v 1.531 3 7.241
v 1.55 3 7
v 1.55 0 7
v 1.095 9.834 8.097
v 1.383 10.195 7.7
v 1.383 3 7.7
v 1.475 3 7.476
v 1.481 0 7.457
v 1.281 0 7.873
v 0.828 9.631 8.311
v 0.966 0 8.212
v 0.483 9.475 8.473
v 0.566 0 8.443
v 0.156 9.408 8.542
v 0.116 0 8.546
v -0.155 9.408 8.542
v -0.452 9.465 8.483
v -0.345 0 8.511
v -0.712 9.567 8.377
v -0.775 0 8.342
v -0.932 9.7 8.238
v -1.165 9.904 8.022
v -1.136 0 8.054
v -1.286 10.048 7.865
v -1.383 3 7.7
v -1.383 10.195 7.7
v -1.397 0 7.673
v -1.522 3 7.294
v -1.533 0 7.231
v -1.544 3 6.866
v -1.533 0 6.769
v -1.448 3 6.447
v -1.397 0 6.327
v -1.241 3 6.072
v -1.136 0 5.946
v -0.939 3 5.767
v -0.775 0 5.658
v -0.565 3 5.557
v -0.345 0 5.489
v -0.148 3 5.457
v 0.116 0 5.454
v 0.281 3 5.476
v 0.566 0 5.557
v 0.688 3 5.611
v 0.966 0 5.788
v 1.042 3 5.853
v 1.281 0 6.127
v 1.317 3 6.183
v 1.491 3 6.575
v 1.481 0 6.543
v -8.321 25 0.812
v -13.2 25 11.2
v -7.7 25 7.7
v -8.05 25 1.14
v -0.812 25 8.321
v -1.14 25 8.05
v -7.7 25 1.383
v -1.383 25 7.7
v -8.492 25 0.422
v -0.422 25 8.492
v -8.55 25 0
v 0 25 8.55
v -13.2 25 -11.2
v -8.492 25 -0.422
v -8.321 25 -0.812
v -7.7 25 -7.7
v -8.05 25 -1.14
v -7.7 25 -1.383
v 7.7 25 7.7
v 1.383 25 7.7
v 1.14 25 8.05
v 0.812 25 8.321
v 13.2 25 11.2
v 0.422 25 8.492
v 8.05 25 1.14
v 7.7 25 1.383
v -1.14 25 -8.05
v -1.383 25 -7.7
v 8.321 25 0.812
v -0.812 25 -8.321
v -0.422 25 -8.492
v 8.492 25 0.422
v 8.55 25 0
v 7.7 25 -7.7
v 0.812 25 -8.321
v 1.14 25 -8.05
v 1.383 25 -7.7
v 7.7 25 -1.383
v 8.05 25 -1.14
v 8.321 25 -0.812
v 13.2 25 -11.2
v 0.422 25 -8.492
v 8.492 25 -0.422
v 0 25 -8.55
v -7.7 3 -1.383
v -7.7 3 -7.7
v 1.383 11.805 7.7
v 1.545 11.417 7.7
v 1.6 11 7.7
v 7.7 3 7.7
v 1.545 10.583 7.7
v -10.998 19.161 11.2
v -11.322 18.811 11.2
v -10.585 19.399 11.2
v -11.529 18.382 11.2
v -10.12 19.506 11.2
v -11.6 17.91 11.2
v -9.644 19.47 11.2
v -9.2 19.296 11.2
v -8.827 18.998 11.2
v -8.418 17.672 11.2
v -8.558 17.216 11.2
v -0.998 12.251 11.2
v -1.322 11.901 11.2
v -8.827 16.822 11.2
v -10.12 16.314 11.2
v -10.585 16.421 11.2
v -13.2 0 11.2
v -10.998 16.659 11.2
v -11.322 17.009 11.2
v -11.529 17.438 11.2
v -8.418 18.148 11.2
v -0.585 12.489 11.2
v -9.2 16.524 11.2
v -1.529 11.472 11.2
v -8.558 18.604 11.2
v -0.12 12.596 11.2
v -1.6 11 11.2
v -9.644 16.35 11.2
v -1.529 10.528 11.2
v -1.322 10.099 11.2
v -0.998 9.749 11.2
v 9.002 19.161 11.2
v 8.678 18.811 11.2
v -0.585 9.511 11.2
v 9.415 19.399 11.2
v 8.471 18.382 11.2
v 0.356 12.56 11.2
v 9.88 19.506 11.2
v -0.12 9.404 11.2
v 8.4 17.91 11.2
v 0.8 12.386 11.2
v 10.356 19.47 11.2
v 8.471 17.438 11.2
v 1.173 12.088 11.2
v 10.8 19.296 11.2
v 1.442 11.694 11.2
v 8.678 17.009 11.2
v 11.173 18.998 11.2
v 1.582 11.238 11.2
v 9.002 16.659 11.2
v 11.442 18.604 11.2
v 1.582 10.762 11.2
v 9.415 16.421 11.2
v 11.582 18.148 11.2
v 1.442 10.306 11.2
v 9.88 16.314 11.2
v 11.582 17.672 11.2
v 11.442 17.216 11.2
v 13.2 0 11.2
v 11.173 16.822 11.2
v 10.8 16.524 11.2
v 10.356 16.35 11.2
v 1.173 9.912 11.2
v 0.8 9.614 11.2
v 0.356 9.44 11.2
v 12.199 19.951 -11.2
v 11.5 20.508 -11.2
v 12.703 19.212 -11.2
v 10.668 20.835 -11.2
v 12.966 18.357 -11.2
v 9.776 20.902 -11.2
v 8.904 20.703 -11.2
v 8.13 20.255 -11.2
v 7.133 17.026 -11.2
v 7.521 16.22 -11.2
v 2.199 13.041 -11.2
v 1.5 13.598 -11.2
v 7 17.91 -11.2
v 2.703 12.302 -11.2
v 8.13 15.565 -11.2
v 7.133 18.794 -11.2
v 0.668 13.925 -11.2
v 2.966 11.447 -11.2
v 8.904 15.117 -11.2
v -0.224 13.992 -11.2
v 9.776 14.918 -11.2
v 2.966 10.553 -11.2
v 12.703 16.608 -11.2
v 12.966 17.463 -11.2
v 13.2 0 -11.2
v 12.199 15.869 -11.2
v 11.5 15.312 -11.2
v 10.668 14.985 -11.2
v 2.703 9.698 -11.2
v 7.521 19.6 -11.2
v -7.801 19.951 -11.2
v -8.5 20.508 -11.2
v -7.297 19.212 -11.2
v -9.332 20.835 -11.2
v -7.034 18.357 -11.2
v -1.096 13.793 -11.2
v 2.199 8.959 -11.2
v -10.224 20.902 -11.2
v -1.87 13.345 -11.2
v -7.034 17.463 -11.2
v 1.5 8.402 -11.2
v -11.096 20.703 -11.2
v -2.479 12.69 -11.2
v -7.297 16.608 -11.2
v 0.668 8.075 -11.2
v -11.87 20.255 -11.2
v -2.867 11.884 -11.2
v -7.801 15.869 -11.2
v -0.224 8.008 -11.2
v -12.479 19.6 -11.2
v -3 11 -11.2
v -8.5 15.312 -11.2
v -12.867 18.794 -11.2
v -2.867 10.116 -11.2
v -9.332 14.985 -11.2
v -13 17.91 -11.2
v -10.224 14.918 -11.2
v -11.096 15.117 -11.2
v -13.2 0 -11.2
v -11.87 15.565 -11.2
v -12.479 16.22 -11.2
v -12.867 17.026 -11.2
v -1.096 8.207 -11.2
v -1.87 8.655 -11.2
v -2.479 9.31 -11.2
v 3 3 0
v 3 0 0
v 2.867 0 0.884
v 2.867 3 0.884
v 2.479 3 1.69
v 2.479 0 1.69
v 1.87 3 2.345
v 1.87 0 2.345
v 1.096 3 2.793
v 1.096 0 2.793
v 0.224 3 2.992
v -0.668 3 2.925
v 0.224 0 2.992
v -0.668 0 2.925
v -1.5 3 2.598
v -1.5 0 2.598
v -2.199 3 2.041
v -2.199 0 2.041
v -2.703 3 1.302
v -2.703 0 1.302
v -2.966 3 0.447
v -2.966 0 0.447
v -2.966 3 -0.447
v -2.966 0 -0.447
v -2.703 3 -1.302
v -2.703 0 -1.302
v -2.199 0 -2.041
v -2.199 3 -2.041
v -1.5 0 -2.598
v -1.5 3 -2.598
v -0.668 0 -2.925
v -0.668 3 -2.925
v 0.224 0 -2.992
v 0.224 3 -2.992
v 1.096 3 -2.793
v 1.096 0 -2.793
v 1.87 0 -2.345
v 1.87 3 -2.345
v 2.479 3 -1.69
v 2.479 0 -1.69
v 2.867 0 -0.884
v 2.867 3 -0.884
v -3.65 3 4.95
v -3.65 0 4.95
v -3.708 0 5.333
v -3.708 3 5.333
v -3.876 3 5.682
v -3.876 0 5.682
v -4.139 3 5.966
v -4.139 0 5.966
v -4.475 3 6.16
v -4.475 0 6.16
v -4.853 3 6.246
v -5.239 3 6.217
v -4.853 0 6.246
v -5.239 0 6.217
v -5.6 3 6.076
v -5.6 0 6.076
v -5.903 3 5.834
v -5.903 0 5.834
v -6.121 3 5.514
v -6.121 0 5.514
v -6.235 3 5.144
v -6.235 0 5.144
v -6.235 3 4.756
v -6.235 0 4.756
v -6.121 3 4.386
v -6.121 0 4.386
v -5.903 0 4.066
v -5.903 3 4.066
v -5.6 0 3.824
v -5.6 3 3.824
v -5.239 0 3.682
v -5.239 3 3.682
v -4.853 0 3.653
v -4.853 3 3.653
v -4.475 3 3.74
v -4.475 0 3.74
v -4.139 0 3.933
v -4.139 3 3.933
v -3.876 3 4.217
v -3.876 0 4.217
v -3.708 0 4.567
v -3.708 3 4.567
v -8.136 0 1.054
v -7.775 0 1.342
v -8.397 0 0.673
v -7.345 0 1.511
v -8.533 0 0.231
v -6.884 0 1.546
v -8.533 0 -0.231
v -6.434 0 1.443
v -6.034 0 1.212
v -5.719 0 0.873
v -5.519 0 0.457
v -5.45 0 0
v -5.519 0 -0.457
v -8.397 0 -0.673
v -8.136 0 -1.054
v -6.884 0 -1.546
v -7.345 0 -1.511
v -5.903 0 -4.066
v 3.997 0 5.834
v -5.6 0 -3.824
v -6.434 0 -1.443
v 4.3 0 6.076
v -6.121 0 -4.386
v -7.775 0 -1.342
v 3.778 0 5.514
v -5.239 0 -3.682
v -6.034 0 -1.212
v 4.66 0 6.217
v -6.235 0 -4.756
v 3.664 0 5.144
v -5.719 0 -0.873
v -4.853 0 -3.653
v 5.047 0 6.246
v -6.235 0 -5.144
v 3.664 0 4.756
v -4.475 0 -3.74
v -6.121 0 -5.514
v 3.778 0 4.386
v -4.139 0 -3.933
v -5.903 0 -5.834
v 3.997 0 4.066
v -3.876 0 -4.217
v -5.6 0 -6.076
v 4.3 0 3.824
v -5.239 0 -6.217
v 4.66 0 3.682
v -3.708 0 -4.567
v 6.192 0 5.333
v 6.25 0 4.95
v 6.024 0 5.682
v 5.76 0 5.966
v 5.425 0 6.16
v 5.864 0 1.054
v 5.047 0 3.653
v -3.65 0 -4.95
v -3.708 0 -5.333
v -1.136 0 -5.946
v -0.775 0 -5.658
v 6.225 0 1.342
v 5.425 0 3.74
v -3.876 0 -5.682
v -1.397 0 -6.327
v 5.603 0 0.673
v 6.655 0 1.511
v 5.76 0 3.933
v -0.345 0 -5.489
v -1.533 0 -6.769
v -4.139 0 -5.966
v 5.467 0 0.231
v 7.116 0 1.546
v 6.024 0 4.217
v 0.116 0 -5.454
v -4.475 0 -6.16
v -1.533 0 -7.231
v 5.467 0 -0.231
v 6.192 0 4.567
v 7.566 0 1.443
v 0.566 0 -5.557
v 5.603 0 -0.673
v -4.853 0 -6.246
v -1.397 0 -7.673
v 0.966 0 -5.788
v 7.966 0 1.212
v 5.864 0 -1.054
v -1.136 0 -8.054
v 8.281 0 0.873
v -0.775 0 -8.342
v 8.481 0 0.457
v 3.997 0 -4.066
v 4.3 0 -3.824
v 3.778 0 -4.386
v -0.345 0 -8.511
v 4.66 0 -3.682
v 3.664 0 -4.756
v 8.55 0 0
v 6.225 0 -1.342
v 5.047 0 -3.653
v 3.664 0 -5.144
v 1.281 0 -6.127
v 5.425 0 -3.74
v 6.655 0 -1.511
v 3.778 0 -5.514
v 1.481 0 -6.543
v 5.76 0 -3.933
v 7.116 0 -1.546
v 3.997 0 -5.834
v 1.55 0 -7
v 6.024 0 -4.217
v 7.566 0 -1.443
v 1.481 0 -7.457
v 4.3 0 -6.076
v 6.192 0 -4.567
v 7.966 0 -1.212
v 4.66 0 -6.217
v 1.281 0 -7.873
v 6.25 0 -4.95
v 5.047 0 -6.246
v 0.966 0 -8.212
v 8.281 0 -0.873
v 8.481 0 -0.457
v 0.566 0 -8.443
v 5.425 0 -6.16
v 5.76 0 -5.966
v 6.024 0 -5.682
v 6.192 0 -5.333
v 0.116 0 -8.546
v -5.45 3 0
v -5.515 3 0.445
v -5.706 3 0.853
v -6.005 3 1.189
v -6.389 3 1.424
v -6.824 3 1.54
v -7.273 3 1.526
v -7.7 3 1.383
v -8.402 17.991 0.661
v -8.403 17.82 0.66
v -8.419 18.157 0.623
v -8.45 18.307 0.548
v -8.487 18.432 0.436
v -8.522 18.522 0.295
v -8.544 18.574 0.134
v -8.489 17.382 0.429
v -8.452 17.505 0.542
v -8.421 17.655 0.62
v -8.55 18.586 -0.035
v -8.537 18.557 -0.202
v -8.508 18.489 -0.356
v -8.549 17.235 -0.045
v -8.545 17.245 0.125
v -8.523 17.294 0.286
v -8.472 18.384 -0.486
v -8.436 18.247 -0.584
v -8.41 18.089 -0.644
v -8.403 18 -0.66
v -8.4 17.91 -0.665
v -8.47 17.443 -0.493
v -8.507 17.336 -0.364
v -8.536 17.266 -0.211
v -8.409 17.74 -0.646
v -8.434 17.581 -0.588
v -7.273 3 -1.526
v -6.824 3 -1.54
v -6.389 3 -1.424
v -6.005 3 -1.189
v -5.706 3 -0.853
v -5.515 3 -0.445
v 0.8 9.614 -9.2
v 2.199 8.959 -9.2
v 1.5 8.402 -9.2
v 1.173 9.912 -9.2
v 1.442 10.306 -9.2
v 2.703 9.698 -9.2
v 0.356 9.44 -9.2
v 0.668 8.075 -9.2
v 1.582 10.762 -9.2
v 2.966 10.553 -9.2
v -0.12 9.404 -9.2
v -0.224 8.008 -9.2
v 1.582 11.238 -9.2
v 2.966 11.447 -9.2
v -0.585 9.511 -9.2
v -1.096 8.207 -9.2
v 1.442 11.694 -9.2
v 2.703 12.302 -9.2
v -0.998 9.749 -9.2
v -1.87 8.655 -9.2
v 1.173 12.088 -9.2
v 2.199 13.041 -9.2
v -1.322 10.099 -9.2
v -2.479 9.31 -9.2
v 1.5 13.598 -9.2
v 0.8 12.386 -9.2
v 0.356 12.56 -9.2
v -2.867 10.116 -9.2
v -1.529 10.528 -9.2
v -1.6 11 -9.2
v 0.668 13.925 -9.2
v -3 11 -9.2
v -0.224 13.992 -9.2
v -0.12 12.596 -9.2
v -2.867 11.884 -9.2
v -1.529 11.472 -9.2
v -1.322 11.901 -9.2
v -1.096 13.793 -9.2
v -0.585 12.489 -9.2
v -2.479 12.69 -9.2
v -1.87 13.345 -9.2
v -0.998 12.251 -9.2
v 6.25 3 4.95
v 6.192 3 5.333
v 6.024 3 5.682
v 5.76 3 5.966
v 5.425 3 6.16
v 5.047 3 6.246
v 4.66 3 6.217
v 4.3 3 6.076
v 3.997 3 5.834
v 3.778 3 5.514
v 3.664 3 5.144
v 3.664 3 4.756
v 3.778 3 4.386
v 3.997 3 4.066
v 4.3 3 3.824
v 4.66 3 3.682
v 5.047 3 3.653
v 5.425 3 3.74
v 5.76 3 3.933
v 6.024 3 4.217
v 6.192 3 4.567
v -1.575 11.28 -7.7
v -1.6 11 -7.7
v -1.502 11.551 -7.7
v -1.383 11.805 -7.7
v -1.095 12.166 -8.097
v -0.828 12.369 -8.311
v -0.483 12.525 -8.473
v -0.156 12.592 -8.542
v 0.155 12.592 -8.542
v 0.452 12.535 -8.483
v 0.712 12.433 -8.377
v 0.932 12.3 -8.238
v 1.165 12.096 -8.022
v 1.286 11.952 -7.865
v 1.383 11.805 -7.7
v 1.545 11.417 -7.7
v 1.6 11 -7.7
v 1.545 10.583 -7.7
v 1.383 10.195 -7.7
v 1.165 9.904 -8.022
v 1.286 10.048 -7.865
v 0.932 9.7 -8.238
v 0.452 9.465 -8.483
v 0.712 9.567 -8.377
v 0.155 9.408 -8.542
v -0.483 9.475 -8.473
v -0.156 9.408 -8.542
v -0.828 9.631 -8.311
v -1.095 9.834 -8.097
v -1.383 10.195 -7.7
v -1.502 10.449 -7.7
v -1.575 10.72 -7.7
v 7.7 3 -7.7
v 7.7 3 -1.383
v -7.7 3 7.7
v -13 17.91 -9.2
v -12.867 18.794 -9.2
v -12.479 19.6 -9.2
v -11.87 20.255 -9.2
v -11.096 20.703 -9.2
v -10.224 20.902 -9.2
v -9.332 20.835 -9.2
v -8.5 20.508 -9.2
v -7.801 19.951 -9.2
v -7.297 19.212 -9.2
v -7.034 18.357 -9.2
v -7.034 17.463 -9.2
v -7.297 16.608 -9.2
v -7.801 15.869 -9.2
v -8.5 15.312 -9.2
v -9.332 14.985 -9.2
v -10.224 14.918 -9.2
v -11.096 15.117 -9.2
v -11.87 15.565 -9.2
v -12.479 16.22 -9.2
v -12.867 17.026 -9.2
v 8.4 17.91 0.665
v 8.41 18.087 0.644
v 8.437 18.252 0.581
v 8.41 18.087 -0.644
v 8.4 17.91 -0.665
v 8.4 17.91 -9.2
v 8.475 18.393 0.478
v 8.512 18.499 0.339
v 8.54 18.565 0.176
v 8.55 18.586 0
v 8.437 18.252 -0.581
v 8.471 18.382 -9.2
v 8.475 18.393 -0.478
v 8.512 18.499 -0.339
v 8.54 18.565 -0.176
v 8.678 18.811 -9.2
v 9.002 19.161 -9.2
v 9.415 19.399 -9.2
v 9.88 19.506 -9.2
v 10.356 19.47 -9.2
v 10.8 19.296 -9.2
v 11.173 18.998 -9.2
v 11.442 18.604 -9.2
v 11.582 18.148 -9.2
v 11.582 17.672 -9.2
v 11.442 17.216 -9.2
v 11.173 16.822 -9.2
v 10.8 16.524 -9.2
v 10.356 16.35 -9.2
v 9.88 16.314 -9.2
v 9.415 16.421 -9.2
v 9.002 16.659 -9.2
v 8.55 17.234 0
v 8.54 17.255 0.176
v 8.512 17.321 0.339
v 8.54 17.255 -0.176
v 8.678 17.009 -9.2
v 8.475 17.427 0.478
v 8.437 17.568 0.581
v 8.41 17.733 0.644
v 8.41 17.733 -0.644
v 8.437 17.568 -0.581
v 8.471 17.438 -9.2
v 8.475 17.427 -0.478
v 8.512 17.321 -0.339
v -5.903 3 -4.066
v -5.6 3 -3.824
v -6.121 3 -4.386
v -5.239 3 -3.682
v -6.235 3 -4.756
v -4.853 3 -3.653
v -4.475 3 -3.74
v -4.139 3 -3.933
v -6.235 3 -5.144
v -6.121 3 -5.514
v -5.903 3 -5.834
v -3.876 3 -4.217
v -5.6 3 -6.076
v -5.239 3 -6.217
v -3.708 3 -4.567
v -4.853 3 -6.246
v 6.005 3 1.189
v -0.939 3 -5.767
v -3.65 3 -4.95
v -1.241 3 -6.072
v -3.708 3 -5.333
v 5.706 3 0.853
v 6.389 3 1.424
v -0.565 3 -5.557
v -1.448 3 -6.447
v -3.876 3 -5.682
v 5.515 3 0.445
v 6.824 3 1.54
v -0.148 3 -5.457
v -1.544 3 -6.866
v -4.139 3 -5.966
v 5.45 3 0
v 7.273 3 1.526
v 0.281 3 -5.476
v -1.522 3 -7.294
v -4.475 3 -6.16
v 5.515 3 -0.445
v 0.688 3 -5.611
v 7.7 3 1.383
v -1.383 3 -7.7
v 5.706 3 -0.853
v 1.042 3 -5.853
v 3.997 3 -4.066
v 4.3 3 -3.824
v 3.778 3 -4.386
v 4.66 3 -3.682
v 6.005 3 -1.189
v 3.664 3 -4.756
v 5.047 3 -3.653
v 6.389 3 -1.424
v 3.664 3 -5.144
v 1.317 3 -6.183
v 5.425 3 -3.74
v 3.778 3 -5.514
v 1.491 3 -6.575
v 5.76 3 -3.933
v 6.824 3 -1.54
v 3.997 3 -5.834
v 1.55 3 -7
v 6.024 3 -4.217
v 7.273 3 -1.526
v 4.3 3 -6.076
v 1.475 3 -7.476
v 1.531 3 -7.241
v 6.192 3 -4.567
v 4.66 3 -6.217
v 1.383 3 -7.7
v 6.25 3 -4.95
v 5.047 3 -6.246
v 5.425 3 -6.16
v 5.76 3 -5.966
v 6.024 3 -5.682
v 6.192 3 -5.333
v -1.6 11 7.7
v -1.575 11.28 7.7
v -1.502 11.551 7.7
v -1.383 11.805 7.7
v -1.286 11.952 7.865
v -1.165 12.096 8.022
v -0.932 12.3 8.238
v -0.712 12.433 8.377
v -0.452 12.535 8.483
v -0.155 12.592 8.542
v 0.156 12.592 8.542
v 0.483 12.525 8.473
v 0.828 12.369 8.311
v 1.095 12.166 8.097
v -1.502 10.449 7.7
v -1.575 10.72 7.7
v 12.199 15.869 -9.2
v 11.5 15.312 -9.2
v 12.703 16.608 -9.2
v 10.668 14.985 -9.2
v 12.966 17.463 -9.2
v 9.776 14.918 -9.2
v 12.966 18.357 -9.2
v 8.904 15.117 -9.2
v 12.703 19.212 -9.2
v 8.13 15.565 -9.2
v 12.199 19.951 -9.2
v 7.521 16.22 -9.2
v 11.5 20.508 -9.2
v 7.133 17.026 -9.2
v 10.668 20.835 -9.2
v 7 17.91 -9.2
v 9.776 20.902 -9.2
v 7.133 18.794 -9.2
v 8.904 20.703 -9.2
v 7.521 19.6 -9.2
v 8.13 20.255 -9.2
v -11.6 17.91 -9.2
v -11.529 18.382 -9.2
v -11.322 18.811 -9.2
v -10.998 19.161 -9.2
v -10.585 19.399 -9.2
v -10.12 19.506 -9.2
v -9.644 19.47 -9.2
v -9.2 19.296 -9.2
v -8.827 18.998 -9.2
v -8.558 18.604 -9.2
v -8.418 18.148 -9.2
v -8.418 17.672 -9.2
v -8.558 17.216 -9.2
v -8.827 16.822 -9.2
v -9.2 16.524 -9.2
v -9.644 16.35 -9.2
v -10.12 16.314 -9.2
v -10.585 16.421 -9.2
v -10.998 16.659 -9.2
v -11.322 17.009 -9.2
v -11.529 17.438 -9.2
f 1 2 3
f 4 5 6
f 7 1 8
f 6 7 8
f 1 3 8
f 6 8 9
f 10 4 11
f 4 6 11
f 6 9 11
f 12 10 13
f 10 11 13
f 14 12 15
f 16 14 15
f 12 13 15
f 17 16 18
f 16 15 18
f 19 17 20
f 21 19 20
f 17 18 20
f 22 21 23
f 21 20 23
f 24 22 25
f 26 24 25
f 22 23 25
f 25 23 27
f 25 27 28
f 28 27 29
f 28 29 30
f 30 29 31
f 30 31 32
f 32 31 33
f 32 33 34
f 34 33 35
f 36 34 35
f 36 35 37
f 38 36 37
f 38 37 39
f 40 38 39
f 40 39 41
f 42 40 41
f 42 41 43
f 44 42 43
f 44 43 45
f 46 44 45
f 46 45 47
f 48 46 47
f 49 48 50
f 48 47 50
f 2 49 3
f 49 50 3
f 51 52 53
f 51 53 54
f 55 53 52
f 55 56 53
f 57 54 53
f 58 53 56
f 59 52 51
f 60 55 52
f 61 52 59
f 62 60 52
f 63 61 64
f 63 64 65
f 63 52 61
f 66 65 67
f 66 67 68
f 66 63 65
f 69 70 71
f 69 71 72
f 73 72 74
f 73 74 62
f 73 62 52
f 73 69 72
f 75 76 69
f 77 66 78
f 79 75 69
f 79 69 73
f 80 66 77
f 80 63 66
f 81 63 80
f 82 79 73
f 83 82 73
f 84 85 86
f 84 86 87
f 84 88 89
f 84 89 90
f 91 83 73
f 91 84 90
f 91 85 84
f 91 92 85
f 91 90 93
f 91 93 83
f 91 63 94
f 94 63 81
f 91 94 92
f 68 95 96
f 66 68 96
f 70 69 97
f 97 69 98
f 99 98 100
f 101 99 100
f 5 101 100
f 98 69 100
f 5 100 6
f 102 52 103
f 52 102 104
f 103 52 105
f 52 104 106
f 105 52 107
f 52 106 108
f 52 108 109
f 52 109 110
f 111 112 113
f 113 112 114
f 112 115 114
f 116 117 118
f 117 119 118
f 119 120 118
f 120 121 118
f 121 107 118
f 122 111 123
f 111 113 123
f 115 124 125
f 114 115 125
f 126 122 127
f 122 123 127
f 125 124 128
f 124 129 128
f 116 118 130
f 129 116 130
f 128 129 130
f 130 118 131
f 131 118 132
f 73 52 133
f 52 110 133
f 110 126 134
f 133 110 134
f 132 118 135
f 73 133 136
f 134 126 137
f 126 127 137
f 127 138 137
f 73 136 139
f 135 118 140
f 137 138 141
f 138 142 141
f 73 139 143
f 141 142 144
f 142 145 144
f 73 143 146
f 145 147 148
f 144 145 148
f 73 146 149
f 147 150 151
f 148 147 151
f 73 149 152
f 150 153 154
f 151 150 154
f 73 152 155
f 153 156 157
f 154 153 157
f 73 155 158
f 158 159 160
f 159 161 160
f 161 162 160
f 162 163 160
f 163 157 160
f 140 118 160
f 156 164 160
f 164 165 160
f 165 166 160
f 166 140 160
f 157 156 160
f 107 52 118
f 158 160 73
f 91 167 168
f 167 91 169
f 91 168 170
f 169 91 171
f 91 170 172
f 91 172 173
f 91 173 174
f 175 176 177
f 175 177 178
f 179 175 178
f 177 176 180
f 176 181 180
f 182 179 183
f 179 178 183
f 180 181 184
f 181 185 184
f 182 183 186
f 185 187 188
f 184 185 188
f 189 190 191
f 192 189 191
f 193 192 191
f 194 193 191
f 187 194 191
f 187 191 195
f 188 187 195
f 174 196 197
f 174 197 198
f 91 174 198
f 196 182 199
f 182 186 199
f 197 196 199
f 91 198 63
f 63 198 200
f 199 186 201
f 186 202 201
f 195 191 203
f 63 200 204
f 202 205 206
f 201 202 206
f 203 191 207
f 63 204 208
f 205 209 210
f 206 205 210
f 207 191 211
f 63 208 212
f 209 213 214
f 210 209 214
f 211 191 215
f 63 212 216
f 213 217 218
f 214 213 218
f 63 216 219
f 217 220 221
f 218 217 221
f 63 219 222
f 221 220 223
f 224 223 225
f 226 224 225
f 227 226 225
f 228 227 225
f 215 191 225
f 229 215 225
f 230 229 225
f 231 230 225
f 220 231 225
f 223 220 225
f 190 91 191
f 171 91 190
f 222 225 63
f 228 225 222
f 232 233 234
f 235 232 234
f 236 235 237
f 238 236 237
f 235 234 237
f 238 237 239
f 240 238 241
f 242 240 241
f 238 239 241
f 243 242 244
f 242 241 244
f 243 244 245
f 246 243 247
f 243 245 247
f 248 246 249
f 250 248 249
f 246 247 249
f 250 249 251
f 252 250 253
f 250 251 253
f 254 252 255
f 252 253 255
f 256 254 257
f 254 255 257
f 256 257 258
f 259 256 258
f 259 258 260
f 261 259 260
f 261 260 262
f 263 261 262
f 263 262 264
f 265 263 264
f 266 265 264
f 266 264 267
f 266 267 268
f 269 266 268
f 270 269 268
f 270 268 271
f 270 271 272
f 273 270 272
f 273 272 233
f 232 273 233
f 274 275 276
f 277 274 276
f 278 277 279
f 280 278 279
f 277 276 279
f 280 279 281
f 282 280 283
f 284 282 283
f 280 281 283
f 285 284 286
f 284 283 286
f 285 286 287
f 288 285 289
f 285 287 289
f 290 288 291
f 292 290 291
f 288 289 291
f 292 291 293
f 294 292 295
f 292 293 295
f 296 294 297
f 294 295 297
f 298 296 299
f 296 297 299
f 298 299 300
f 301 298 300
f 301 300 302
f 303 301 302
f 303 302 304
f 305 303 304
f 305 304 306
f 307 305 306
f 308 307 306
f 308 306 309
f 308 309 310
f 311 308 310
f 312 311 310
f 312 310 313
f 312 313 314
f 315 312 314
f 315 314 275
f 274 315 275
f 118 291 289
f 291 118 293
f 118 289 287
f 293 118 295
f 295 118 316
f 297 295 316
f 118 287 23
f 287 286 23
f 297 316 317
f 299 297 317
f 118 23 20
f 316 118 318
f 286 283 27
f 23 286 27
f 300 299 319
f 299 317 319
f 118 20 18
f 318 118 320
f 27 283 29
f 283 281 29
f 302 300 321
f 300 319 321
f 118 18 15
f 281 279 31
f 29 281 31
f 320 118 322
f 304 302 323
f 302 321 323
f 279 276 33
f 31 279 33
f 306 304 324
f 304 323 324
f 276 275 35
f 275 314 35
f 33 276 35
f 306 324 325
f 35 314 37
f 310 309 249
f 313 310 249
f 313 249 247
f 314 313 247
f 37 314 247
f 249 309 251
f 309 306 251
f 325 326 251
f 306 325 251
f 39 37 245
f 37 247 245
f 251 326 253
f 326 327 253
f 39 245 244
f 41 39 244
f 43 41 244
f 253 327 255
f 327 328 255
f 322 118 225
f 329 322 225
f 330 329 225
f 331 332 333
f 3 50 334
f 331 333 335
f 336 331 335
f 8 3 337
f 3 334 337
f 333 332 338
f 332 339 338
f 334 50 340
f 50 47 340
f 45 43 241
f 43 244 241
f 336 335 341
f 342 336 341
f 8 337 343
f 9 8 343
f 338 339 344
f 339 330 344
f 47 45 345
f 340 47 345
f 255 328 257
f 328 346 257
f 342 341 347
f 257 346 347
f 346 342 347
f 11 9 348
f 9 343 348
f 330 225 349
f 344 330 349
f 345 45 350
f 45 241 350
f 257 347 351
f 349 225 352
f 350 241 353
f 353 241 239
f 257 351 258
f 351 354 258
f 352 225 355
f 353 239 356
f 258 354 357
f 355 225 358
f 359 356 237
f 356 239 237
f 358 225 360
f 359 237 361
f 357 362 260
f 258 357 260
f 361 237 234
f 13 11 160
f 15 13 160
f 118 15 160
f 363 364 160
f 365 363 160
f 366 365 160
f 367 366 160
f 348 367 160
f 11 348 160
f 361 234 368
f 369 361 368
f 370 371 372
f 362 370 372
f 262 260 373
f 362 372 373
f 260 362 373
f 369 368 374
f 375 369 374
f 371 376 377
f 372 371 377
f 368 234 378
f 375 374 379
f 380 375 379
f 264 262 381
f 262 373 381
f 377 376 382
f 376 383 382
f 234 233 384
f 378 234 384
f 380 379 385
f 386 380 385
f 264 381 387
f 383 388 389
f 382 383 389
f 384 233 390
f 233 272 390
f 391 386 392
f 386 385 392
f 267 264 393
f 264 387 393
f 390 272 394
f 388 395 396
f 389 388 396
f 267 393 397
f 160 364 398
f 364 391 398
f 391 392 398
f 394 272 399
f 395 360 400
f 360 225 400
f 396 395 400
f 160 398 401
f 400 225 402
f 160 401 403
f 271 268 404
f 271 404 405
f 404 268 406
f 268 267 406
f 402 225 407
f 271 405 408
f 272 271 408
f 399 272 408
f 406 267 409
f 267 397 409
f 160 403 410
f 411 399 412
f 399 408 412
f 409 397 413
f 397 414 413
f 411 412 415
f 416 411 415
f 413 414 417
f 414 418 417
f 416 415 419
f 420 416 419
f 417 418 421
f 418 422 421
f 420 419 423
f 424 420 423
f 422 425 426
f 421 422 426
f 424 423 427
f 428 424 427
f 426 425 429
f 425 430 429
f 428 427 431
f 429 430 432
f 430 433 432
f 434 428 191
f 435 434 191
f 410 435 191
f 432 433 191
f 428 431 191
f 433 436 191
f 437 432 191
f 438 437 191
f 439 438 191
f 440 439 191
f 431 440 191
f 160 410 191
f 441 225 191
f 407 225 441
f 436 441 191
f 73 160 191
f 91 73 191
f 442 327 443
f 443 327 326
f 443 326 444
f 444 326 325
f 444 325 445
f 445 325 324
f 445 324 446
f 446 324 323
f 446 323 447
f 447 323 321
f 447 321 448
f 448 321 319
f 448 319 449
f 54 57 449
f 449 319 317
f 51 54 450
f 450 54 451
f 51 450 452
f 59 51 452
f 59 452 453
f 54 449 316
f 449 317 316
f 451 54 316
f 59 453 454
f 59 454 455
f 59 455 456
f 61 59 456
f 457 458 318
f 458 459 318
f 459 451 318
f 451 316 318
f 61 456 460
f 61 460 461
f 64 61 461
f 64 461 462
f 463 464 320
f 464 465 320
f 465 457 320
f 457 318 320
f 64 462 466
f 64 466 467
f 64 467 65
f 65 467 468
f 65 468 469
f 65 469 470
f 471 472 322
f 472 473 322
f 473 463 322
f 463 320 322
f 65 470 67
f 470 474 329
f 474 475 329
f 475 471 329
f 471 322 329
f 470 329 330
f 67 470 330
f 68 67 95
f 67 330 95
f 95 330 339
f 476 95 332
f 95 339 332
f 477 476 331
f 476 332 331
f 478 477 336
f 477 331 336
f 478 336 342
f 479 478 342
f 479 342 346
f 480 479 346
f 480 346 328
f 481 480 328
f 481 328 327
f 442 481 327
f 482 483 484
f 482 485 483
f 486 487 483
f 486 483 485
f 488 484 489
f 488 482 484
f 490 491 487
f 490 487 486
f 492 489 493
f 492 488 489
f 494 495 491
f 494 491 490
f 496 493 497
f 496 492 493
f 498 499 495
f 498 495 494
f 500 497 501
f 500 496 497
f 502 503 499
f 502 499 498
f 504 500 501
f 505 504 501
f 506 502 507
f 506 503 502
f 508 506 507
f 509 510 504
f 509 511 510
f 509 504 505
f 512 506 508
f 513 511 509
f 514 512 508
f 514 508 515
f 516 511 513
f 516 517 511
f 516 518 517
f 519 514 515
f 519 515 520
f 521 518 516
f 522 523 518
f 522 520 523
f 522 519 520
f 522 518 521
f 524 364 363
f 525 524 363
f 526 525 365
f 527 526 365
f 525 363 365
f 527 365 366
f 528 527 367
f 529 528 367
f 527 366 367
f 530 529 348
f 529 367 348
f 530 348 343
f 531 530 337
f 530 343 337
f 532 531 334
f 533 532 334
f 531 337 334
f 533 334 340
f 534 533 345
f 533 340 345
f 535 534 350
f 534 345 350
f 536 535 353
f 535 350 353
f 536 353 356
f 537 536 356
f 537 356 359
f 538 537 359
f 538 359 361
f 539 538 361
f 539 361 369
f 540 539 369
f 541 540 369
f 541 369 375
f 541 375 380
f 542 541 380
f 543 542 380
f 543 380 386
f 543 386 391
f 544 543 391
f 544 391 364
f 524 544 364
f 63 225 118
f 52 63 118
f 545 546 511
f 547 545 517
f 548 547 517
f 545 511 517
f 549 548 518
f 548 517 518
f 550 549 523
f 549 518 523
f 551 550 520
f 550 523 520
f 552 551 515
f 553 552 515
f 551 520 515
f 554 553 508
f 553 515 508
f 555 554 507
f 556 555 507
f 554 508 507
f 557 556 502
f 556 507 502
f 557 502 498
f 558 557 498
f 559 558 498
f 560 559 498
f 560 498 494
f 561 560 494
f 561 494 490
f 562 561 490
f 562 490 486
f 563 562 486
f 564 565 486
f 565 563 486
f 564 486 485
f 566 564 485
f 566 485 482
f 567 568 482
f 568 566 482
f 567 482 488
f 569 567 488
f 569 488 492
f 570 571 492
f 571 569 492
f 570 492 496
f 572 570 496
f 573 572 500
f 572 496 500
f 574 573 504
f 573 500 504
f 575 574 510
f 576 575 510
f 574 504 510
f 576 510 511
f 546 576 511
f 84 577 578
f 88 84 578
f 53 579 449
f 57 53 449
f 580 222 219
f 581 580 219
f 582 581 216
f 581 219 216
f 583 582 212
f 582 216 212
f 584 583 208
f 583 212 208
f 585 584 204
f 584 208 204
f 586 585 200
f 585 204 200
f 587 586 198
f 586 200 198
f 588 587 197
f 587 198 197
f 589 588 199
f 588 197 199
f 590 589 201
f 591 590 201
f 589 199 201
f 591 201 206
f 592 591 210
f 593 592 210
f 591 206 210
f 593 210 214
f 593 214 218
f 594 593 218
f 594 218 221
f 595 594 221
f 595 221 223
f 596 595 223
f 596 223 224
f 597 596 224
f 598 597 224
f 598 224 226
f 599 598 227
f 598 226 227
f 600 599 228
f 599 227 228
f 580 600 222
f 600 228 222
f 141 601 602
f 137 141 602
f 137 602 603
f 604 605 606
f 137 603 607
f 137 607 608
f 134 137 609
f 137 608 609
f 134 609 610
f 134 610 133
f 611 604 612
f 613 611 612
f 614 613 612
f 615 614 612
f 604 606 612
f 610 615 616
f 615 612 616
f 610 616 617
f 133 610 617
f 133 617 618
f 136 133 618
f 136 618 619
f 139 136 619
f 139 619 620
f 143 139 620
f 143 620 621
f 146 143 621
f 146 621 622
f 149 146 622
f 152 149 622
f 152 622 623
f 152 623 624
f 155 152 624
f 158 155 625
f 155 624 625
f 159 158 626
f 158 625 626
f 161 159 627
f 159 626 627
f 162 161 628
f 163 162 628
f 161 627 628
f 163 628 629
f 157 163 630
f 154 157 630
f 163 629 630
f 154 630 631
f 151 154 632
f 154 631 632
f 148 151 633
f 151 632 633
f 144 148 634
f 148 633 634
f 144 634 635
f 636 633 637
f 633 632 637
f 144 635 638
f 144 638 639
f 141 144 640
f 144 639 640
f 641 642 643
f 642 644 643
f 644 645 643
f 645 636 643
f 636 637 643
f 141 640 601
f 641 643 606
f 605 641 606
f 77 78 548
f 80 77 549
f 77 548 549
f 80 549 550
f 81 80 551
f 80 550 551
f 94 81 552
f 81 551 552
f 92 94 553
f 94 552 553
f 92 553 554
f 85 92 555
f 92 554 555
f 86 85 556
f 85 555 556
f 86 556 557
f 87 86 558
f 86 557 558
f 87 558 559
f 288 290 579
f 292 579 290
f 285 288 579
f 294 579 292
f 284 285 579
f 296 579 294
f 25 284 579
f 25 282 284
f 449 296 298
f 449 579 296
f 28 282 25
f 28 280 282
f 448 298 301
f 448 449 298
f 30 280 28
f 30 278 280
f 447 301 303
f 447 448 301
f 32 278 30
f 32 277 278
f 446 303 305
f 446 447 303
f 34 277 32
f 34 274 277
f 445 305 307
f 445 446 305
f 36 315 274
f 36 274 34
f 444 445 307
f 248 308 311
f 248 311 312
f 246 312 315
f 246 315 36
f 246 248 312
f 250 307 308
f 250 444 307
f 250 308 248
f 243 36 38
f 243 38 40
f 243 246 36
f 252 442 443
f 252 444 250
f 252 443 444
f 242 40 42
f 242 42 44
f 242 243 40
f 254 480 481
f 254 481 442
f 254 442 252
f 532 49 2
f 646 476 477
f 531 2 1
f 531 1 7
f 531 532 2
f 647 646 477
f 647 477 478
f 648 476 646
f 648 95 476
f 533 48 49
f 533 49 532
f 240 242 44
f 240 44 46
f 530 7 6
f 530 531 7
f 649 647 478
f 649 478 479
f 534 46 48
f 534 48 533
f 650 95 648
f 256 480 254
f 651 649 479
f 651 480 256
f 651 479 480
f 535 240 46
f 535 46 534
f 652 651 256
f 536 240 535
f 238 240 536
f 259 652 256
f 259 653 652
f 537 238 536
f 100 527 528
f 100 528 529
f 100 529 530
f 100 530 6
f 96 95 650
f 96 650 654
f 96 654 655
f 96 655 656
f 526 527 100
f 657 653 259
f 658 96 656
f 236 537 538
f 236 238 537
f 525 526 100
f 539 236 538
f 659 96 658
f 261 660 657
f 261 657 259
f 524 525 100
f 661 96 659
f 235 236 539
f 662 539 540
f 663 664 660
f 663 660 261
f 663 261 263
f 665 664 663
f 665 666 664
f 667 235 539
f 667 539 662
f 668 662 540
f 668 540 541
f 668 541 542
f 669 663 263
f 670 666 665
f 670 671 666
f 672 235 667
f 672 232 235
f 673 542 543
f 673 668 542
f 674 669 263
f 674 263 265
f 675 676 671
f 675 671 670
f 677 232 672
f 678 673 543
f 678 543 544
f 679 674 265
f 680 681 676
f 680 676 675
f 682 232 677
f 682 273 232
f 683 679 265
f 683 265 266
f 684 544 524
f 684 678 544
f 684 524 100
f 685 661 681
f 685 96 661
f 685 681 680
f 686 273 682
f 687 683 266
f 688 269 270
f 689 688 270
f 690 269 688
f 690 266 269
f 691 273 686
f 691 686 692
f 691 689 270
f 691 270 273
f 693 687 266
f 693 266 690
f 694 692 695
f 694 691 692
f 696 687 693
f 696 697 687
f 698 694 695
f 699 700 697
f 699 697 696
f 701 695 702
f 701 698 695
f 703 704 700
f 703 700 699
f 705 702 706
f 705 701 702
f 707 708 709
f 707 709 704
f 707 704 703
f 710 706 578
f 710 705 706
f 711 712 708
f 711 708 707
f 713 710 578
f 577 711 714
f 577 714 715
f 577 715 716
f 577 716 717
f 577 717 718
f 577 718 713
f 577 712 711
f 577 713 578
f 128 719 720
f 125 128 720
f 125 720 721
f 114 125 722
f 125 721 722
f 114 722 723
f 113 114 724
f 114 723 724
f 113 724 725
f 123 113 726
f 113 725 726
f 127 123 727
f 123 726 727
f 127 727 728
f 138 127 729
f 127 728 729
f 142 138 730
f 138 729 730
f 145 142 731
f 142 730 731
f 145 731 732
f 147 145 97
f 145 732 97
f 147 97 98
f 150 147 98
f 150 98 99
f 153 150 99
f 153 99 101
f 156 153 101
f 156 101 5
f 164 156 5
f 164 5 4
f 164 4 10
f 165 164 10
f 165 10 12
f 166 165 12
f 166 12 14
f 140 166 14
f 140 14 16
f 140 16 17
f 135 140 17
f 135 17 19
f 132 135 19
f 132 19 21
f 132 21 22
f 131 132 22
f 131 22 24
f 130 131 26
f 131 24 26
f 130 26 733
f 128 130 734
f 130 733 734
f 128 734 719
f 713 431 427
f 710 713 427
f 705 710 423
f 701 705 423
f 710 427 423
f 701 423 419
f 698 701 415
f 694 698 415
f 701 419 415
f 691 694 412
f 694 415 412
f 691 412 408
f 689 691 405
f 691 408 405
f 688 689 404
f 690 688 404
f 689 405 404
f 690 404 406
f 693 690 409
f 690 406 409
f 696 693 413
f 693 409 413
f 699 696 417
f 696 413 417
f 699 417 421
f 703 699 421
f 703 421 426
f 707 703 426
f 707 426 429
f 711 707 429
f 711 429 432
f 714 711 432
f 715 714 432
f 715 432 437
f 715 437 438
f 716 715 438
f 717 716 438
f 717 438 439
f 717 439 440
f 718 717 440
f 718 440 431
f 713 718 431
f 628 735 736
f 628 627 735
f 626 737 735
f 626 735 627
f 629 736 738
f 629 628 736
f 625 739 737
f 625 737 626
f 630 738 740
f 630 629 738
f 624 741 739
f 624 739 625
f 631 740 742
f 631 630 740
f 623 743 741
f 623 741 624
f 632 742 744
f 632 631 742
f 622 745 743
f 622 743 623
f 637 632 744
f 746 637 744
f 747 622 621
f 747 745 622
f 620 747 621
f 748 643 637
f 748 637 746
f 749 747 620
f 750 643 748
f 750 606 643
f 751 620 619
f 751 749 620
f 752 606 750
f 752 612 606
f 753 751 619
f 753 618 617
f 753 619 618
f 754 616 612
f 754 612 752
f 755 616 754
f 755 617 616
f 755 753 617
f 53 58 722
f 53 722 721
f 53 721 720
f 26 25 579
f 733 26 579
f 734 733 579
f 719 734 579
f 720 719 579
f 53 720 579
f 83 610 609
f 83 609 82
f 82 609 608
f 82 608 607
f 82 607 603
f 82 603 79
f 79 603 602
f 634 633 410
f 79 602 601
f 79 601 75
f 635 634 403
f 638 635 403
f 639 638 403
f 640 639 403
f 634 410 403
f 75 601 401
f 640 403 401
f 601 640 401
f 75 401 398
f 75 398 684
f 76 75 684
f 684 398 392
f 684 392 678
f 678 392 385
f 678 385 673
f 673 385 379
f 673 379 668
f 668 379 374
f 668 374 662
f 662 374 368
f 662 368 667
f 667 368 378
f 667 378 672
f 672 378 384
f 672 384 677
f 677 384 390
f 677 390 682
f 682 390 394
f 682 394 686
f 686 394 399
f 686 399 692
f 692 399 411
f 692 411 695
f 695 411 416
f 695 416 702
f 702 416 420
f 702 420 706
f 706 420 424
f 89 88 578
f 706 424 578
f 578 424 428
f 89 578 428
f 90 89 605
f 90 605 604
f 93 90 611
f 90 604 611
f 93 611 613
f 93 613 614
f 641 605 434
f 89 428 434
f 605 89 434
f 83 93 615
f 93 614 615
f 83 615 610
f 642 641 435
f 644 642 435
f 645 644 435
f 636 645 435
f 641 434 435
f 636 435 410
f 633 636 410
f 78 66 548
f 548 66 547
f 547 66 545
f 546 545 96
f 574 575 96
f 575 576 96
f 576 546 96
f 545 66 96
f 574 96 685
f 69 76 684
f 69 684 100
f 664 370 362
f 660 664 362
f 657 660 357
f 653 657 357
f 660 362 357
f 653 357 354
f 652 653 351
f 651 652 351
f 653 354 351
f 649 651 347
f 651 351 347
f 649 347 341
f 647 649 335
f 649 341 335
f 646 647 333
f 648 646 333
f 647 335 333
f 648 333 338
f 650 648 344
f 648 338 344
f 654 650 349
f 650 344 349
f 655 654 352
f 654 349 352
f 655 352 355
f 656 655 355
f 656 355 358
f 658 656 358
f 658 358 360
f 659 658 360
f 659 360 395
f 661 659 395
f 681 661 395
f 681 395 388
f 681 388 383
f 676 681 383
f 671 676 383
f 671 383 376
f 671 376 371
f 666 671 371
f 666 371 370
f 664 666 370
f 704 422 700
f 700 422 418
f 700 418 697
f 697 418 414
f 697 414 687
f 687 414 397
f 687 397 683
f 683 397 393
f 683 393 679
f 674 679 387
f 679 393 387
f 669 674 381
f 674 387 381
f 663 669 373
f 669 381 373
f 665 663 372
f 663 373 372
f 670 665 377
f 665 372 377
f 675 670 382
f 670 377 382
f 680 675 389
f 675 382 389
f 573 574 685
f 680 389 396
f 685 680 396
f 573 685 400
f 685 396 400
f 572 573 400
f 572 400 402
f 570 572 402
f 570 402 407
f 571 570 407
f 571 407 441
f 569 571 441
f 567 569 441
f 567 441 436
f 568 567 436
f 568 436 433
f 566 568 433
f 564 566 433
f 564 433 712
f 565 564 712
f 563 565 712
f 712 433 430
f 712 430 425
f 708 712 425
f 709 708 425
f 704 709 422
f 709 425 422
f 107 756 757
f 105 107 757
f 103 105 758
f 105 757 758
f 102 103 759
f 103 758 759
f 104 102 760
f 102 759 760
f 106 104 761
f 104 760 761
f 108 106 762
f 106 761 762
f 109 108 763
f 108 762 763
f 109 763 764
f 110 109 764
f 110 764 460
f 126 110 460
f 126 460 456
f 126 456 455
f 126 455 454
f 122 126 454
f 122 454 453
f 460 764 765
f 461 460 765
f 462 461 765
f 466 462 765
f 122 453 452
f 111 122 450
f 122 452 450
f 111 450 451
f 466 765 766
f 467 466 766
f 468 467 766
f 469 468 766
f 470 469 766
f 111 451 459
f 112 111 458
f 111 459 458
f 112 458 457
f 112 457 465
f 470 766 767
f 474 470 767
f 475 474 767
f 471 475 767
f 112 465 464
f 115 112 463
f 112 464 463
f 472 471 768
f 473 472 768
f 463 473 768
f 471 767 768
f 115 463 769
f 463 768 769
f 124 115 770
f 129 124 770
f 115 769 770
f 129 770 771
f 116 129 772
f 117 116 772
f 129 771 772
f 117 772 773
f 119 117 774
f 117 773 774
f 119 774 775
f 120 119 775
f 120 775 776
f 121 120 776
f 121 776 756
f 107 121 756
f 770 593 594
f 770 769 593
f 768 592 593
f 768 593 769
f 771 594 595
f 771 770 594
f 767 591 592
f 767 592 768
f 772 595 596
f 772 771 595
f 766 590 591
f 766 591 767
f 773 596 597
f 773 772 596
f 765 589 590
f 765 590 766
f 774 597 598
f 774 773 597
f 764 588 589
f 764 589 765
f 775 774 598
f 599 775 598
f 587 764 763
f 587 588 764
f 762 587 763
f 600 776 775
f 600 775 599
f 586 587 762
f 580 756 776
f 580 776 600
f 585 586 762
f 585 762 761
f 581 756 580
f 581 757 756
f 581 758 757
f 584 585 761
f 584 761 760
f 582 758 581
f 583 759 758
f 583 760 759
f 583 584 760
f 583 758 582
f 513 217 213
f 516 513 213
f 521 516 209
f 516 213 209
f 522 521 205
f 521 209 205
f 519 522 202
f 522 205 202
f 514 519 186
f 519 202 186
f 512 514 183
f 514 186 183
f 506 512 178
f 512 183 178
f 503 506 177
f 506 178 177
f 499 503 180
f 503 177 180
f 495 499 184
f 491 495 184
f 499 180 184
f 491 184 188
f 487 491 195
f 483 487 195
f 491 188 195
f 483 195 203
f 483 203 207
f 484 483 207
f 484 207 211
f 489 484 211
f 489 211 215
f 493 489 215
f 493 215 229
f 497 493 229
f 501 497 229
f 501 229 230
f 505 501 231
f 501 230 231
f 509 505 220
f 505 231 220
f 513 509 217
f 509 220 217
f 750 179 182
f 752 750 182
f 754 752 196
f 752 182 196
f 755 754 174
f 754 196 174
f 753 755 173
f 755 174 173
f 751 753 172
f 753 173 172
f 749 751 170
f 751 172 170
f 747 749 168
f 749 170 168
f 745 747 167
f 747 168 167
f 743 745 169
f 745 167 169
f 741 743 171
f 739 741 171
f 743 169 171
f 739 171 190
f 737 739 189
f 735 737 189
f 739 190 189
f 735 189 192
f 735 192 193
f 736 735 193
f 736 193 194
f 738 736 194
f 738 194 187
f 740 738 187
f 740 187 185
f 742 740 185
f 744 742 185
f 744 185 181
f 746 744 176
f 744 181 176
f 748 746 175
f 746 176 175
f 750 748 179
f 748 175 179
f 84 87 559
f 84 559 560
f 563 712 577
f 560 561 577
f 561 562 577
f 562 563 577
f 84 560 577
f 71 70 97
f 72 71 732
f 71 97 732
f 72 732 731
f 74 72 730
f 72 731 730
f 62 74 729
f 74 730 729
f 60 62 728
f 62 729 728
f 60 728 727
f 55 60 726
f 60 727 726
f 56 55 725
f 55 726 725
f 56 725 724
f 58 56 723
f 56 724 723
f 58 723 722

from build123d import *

# Parameters (mm, degrees)
SKETCH_1_W          = 15.4
SKETCH_1_H          = 22.4
EXTRUDE_2_DEPTH     = 3
SKETCH_1_4_W        = 15.4
SKETCH_1_4_H        = 3.5
EXTRUDE_3_DEPTH     = 10
EXTRUDE_3_2_DEPTH   = 10
SKETCH_1_5_W        = 26.4
SKETCH_1_5_H        = 22.4
SKETCH_1_5_W_2      = 15.4
SKETCH_1_5_H_2      = 15.4
EXTRUDE_4_DEPTH     = 25
SKETCH_3_R          = 1.6
CUT_EXTRUDE_2_DEPTH = 42.807654801
SKETCH_9_R          = 1.3
SKETCH_9_R_2        = 3
SKETCH_9_R_3        = 1.55
CUT_EXTRUDE_6_DEPTH = 31.408551429
SKETCH_10_R         = 3
CUT_EXTRUDE_7_DEPTH = 2


with BuildPart() as part:
    # 草图1 → 凸台-拉伸2 (new body)
    with BuildSketch(Plane(origin=(0, 0, 0), x_dir=(1, 0, 0), z_dir=(0, 1, 0))):
        Rectangle(SKETCH_1_W, SKETCH_1_H)
    extrude(amount=EXTRUDE_2_DEPTH)



with BuildPart() as body_2:
    # 草图1<4> → 凸台-拉伸3 (new body)
    with BuildSketch(Plane(origin=(0, 0, 0), x_dir=(1, 0, 0), z_dir=(0, 1, 0))):
        with Locations((0, 9.45)):
            Rectangle(SKETCH_1_4_W, SKETCH_1_4_H)
    extrude(amount=EXTRUDE_3_DEPTH)


with BuildPart() as body_3:
    # 草图1<4> → Extrude 3 2 (new body)
    with BuildSketch(Plane(origin=(0, 0, 0), x_dir=(1, 0, 0), z_dir=(0, 1, 0))):
        with Locations((0, -9.45)):
            Rectangle(SKETCH_1_4_W, SKETCH_1_4_H)
    extrude(amount=EXTRUDE_3_2_DEPTH)


with BuildPart() as part_1:
    add(part.part)

    add(body_2.part)  # 凸台-拉伸4 merges body 2

    add(body_3.part)  # 凸台-拉伸4 merges body 3
    # 草图1<5> → 凸台-拉伸4 (add)
    with BuildSketch(Plane(origin=(0, 0, 0), x_dir=(1, 0, 0), z_dir=(0, 1, 0))):
        Rectangle(SKETCH_1_5_W, SKETCH_1_5_H)
        Rectangle(SKETCH_1_5_W_2, SKETCH_1_5_H_2, mode=Mode.SUBTRACT)
    extrude(amount=EXTRUDE_4_DEPTH)

    # 草图3 → 切除-拉伸2 (cut, through all)
    with BuildSketch(Plane(origin=(0, 0, -19.6), x_dir=(-1, 0, 0), z_dir=(0, 0, -1))):
        with Locations((10, 17.91)):
            Circle(SKETCH_3_R)
        with Locations((0, 11)):
            Circle(SKETCH_3_R)
        with Locations((-10, 17.91)):
            Circle(SKETCH_3_R)
    extrude(amount=-CUT_EXTRUDE_2_DEPTH, mode=Mode.SUBTRACT)

    # 草图9 → 切除-拉伸6 (cut, through all)
    with BuildSketch(Plane.XZ):
        with Locations((-4.949747468, -4.949747468)):
            Circle(SKETCH_9_R)
        with Locations((4.949747468, -4.949747468)):
            Circle(SKETCH_9_R)
        with Locations((4.949747468, 4.949747468)):
            Circle(SKETCH_9_R)
        with Locations((-4.949747468, 4.949747468)):
            Circle(SKETCH_9_R)
        Circle(SKETCH_9_R_2)
        with Locations((7, 0)):
            Circle(SKETCH_9_R_3)
        with Locations((0, 7)):
            Circle(SKETCH_9_R_3)
        with Locations((0, -7)):
            Circle(SKETCH_9_R_3)
        with Locations((-7, 0)):
            Circle(SKETCH_9_R_3)
    extrude(amount=-CUT_EXTRUDE_6_DEPTH, mode=Mode.SUBTRACT)

    # 草图10 → 切除-拉伸7 (cut)
    with BuildSketch(Plane(origin=(0, 0, -11.2), x_dir=(-1, 0, 0), z_dir=(0, 0, -1))):
        with Locations((10, 17.91)):
            Circle(SKETCH_10_R)
        with Locations((0, 11)):
            Circle(SKETCH_10_R)
        with Locations((-10, 17.91)):
            Circle(SKETCH_10_R)
    extrude(amount=-CUT_EXTRUDE_7_DEPTH, mode=Mode.SUBTRACT)


solid = part_1.part
